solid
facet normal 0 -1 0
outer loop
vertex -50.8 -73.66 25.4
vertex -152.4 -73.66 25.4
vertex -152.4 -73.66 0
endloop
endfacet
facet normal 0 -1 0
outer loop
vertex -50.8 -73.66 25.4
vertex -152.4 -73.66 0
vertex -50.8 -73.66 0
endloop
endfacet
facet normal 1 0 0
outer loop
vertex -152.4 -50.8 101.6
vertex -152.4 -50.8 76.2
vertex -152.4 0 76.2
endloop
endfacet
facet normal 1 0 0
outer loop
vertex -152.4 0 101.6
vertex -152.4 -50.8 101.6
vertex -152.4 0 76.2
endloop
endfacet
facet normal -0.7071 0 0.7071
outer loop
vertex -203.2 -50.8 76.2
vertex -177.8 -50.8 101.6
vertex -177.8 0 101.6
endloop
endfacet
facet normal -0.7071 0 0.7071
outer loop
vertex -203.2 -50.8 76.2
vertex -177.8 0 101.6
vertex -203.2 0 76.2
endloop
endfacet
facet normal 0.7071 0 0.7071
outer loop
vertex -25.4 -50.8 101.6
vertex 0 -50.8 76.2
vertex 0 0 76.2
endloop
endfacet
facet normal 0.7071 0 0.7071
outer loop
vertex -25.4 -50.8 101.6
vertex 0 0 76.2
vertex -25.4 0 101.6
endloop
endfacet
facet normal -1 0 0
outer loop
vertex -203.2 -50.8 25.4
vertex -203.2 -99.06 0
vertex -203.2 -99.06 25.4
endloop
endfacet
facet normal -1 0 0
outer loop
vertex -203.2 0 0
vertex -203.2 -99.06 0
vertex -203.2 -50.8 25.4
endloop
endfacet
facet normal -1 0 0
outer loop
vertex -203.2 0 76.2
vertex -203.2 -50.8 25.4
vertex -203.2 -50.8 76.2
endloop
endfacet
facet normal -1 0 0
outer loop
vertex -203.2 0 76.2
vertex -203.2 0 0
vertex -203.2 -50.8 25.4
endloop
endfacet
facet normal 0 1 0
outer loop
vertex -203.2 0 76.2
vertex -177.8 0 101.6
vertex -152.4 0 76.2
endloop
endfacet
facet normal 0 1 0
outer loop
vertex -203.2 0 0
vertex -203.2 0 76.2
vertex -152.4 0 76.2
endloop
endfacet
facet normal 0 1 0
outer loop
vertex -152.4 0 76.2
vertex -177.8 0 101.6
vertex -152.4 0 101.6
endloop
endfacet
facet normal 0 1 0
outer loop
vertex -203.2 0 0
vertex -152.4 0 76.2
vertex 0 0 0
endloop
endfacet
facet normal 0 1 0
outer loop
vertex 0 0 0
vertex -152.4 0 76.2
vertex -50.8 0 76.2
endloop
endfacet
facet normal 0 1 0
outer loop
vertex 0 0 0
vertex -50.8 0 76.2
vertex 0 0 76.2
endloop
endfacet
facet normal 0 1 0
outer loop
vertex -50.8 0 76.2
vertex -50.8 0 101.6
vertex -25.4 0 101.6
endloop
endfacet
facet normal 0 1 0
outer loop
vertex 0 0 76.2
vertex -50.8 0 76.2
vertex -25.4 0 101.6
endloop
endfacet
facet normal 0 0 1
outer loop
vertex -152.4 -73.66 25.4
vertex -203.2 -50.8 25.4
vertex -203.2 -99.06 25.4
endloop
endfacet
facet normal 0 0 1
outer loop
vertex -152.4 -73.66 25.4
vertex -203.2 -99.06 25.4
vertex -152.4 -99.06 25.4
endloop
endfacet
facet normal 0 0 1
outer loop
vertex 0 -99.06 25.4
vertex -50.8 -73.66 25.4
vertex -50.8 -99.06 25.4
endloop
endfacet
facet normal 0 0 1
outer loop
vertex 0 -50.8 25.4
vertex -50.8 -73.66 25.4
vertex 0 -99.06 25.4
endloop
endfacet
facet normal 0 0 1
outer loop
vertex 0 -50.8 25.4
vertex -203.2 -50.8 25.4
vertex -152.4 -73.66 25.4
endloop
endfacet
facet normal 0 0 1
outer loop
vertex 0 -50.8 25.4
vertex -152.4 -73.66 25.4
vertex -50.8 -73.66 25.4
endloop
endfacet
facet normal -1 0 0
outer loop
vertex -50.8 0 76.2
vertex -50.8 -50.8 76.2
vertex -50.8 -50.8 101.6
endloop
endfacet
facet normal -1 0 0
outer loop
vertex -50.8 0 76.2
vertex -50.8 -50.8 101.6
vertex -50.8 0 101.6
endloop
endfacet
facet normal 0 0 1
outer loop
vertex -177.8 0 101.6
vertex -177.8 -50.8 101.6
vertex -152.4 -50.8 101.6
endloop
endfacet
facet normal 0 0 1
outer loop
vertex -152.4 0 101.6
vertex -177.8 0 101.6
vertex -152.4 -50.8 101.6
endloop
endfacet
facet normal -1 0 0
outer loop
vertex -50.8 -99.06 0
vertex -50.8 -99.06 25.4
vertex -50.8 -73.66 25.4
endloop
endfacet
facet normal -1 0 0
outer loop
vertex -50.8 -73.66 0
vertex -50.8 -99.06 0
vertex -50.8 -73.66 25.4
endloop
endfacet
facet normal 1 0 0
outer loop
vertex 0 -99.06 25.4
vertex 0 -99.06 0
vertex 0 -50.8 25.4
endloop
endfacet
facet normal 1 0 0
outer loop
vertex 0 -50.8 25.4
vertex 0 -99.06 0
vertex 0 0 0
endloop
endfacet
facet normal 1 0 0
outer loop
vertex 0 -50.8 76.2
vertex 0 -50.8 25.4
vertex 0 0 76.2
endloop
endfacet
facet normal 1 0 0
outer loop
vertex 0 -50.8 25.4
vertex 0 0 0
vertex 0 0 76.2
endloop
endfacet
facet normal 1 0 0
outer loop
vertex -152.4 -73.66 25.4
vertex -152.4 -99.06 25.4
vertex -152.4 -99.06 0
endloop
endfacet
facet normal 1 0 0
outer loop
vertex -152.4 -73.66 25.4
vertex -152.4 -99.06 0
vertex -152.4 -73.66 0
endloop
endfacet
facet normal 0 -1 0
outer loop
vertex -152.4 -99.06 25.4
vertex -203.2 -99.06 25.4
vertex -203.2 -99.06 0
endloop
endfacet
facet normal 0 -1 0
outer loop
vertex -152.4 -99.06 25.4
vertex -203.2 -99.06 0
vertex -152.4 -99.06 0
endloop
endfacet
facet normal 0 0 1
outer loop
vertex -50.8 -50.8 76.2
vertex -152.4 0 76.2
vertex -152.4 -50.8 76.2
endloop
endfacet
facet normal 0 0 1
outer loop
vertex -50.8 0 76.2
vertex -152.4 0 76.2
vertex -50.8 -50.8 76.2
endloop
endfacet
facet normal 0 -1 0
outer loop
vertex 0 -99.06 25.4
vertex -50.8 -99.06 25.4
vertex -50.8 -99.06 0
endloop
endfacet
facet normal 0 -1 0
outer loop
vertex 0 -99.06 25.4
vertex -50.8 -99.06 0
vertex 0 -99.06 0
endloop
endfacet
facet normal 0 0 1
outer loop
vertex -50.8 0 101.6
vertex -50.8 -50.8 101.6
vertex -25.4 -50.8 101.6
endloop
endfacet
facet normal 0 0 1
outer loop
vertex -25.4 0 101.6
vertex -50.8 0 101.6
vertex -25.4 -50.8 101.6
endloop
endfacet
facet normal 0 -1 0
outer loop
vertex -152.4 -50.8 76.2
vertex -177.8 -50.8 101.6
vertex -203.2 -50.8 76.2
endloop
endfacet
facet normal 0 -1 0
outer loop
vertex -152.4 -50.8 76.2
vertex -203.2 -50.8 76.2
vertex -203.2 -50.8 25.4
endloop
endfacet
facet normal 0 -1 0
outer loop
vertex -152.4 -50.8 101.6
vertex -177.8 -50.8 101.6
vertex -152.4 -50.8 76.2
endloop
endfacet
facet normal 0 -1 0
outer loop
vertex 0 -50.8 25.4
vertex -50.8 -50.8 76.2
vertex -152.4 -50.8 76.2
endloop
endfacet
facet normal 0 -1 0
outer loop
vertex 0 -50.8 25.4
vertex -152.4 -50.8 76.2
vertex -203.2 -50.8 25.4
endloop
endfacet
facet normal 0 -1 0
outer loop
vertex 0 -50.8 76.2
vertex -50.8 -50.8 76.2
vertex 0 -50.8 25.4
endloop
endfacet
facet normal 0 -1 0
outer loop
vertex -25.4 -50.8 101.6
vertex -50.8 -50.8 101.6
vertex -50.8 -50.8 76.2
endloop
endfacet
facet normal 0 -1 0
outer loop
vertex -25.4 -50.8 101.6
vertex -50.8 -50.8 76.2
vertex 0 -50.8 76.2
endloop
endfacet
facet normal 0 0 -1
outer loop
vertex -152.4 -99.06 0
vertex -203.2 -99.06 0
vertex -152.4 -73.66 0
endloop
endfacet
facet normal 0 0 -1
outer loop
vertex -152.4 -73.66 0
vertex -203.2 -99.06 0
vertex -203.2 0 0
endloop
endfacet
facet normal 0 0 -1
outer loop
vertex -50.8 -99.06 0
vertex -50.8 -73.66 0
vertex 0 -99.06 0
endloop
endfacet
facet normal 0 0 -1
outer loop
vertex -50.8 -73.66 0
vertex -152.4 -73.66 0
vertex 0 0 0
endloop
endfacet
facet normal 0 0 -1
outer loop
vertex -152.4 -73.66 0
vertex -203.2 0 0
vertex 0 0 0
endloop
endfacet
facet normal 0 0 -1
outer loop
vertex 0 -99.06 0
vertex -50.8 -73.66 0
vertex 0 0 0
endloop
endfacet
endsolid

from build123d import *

# Parameters (mm, degrees)
F0_W      = 203.2
F0_H      = 76.2
F1_DEPTH  = 50.8
F2_W      = 50.8
F2_H      = 50.8
F3_DEPTH  = 25.4
F4_W      = 203.2
F4_H      = 25.4
F5_DEPTH  = 48.26
F6_W      = 101.6
F6_H      = 25.4
F7_DEPTH  = 25.4
F8_W      = 25.4
F8_H      = 50.8
F9_DEPTH  = 25.4
F11_DEPTH = 50.8


with BuildPart() as f1:
    # F0 (on Front) → F1 (new body)
    with BuildSketch(Plane.XZ):
        with Locations((-101.6, 38.1)):
            Rectangle(F0_W, F0_H)
    extrude(amount=F1_DEPTH)

    # F2 (on face) → F3 (join)
    with BuildSketch(Plane.XY.offset(76.2)):
        with Locations((-177.8, -25.4)):
            Rectangle(F2_W, F2_H)
        with Locations((-25.4, -25.4)):
            Rectangle(F2_W, F2_H)
    extrude(amount=F3_DEPTH)

    # F4 (on face) → F5 (join)
    with BuildSketch(Plane.XZ.offset(50.8)):
        with Locations((-101.6, 12.7)):
            Rectangle(F4_W, F4_H)
    extrude(amount=F5_DEPTH)

    # F6 (on face) → F7 (cut)
    with BuildSketch(Plane.XY.offset(25.4)):
        with Locations((-101.6, -86.36)):
            Rectangle(F6_W, F6_H)
    extrude(amount=-F7_DEPTH, mode=Mode.SUBTRACT)

    # F8 (on face) → F9 (cut)
    with BuildSketch(Plane.XY.offset(101.6)):
        with Locations((-12.7, -25.4)):
            Rectangle(F8_W, F8_H)
        with Locations((-190.5, -25.4)):
            Rectangle(F8_W, F8_H)
    extrude(amount=-F9_DEPTH, mode=Mode.SUBTRACT)

    # F10 (on face) → F11 (join)
    with BuildSketch(Plane.XZ.offset(50.8)):
        Polygon((0, 76.2), (-25.4, 101.6), (-25.4, 76.2), align=None)
        Polygon((-177.8, 101.6), (-203.2, 76.2), (-177.8, 76.2), align=None)
    extrude(amount=-F11_DEPTH)


solid = f1.part
